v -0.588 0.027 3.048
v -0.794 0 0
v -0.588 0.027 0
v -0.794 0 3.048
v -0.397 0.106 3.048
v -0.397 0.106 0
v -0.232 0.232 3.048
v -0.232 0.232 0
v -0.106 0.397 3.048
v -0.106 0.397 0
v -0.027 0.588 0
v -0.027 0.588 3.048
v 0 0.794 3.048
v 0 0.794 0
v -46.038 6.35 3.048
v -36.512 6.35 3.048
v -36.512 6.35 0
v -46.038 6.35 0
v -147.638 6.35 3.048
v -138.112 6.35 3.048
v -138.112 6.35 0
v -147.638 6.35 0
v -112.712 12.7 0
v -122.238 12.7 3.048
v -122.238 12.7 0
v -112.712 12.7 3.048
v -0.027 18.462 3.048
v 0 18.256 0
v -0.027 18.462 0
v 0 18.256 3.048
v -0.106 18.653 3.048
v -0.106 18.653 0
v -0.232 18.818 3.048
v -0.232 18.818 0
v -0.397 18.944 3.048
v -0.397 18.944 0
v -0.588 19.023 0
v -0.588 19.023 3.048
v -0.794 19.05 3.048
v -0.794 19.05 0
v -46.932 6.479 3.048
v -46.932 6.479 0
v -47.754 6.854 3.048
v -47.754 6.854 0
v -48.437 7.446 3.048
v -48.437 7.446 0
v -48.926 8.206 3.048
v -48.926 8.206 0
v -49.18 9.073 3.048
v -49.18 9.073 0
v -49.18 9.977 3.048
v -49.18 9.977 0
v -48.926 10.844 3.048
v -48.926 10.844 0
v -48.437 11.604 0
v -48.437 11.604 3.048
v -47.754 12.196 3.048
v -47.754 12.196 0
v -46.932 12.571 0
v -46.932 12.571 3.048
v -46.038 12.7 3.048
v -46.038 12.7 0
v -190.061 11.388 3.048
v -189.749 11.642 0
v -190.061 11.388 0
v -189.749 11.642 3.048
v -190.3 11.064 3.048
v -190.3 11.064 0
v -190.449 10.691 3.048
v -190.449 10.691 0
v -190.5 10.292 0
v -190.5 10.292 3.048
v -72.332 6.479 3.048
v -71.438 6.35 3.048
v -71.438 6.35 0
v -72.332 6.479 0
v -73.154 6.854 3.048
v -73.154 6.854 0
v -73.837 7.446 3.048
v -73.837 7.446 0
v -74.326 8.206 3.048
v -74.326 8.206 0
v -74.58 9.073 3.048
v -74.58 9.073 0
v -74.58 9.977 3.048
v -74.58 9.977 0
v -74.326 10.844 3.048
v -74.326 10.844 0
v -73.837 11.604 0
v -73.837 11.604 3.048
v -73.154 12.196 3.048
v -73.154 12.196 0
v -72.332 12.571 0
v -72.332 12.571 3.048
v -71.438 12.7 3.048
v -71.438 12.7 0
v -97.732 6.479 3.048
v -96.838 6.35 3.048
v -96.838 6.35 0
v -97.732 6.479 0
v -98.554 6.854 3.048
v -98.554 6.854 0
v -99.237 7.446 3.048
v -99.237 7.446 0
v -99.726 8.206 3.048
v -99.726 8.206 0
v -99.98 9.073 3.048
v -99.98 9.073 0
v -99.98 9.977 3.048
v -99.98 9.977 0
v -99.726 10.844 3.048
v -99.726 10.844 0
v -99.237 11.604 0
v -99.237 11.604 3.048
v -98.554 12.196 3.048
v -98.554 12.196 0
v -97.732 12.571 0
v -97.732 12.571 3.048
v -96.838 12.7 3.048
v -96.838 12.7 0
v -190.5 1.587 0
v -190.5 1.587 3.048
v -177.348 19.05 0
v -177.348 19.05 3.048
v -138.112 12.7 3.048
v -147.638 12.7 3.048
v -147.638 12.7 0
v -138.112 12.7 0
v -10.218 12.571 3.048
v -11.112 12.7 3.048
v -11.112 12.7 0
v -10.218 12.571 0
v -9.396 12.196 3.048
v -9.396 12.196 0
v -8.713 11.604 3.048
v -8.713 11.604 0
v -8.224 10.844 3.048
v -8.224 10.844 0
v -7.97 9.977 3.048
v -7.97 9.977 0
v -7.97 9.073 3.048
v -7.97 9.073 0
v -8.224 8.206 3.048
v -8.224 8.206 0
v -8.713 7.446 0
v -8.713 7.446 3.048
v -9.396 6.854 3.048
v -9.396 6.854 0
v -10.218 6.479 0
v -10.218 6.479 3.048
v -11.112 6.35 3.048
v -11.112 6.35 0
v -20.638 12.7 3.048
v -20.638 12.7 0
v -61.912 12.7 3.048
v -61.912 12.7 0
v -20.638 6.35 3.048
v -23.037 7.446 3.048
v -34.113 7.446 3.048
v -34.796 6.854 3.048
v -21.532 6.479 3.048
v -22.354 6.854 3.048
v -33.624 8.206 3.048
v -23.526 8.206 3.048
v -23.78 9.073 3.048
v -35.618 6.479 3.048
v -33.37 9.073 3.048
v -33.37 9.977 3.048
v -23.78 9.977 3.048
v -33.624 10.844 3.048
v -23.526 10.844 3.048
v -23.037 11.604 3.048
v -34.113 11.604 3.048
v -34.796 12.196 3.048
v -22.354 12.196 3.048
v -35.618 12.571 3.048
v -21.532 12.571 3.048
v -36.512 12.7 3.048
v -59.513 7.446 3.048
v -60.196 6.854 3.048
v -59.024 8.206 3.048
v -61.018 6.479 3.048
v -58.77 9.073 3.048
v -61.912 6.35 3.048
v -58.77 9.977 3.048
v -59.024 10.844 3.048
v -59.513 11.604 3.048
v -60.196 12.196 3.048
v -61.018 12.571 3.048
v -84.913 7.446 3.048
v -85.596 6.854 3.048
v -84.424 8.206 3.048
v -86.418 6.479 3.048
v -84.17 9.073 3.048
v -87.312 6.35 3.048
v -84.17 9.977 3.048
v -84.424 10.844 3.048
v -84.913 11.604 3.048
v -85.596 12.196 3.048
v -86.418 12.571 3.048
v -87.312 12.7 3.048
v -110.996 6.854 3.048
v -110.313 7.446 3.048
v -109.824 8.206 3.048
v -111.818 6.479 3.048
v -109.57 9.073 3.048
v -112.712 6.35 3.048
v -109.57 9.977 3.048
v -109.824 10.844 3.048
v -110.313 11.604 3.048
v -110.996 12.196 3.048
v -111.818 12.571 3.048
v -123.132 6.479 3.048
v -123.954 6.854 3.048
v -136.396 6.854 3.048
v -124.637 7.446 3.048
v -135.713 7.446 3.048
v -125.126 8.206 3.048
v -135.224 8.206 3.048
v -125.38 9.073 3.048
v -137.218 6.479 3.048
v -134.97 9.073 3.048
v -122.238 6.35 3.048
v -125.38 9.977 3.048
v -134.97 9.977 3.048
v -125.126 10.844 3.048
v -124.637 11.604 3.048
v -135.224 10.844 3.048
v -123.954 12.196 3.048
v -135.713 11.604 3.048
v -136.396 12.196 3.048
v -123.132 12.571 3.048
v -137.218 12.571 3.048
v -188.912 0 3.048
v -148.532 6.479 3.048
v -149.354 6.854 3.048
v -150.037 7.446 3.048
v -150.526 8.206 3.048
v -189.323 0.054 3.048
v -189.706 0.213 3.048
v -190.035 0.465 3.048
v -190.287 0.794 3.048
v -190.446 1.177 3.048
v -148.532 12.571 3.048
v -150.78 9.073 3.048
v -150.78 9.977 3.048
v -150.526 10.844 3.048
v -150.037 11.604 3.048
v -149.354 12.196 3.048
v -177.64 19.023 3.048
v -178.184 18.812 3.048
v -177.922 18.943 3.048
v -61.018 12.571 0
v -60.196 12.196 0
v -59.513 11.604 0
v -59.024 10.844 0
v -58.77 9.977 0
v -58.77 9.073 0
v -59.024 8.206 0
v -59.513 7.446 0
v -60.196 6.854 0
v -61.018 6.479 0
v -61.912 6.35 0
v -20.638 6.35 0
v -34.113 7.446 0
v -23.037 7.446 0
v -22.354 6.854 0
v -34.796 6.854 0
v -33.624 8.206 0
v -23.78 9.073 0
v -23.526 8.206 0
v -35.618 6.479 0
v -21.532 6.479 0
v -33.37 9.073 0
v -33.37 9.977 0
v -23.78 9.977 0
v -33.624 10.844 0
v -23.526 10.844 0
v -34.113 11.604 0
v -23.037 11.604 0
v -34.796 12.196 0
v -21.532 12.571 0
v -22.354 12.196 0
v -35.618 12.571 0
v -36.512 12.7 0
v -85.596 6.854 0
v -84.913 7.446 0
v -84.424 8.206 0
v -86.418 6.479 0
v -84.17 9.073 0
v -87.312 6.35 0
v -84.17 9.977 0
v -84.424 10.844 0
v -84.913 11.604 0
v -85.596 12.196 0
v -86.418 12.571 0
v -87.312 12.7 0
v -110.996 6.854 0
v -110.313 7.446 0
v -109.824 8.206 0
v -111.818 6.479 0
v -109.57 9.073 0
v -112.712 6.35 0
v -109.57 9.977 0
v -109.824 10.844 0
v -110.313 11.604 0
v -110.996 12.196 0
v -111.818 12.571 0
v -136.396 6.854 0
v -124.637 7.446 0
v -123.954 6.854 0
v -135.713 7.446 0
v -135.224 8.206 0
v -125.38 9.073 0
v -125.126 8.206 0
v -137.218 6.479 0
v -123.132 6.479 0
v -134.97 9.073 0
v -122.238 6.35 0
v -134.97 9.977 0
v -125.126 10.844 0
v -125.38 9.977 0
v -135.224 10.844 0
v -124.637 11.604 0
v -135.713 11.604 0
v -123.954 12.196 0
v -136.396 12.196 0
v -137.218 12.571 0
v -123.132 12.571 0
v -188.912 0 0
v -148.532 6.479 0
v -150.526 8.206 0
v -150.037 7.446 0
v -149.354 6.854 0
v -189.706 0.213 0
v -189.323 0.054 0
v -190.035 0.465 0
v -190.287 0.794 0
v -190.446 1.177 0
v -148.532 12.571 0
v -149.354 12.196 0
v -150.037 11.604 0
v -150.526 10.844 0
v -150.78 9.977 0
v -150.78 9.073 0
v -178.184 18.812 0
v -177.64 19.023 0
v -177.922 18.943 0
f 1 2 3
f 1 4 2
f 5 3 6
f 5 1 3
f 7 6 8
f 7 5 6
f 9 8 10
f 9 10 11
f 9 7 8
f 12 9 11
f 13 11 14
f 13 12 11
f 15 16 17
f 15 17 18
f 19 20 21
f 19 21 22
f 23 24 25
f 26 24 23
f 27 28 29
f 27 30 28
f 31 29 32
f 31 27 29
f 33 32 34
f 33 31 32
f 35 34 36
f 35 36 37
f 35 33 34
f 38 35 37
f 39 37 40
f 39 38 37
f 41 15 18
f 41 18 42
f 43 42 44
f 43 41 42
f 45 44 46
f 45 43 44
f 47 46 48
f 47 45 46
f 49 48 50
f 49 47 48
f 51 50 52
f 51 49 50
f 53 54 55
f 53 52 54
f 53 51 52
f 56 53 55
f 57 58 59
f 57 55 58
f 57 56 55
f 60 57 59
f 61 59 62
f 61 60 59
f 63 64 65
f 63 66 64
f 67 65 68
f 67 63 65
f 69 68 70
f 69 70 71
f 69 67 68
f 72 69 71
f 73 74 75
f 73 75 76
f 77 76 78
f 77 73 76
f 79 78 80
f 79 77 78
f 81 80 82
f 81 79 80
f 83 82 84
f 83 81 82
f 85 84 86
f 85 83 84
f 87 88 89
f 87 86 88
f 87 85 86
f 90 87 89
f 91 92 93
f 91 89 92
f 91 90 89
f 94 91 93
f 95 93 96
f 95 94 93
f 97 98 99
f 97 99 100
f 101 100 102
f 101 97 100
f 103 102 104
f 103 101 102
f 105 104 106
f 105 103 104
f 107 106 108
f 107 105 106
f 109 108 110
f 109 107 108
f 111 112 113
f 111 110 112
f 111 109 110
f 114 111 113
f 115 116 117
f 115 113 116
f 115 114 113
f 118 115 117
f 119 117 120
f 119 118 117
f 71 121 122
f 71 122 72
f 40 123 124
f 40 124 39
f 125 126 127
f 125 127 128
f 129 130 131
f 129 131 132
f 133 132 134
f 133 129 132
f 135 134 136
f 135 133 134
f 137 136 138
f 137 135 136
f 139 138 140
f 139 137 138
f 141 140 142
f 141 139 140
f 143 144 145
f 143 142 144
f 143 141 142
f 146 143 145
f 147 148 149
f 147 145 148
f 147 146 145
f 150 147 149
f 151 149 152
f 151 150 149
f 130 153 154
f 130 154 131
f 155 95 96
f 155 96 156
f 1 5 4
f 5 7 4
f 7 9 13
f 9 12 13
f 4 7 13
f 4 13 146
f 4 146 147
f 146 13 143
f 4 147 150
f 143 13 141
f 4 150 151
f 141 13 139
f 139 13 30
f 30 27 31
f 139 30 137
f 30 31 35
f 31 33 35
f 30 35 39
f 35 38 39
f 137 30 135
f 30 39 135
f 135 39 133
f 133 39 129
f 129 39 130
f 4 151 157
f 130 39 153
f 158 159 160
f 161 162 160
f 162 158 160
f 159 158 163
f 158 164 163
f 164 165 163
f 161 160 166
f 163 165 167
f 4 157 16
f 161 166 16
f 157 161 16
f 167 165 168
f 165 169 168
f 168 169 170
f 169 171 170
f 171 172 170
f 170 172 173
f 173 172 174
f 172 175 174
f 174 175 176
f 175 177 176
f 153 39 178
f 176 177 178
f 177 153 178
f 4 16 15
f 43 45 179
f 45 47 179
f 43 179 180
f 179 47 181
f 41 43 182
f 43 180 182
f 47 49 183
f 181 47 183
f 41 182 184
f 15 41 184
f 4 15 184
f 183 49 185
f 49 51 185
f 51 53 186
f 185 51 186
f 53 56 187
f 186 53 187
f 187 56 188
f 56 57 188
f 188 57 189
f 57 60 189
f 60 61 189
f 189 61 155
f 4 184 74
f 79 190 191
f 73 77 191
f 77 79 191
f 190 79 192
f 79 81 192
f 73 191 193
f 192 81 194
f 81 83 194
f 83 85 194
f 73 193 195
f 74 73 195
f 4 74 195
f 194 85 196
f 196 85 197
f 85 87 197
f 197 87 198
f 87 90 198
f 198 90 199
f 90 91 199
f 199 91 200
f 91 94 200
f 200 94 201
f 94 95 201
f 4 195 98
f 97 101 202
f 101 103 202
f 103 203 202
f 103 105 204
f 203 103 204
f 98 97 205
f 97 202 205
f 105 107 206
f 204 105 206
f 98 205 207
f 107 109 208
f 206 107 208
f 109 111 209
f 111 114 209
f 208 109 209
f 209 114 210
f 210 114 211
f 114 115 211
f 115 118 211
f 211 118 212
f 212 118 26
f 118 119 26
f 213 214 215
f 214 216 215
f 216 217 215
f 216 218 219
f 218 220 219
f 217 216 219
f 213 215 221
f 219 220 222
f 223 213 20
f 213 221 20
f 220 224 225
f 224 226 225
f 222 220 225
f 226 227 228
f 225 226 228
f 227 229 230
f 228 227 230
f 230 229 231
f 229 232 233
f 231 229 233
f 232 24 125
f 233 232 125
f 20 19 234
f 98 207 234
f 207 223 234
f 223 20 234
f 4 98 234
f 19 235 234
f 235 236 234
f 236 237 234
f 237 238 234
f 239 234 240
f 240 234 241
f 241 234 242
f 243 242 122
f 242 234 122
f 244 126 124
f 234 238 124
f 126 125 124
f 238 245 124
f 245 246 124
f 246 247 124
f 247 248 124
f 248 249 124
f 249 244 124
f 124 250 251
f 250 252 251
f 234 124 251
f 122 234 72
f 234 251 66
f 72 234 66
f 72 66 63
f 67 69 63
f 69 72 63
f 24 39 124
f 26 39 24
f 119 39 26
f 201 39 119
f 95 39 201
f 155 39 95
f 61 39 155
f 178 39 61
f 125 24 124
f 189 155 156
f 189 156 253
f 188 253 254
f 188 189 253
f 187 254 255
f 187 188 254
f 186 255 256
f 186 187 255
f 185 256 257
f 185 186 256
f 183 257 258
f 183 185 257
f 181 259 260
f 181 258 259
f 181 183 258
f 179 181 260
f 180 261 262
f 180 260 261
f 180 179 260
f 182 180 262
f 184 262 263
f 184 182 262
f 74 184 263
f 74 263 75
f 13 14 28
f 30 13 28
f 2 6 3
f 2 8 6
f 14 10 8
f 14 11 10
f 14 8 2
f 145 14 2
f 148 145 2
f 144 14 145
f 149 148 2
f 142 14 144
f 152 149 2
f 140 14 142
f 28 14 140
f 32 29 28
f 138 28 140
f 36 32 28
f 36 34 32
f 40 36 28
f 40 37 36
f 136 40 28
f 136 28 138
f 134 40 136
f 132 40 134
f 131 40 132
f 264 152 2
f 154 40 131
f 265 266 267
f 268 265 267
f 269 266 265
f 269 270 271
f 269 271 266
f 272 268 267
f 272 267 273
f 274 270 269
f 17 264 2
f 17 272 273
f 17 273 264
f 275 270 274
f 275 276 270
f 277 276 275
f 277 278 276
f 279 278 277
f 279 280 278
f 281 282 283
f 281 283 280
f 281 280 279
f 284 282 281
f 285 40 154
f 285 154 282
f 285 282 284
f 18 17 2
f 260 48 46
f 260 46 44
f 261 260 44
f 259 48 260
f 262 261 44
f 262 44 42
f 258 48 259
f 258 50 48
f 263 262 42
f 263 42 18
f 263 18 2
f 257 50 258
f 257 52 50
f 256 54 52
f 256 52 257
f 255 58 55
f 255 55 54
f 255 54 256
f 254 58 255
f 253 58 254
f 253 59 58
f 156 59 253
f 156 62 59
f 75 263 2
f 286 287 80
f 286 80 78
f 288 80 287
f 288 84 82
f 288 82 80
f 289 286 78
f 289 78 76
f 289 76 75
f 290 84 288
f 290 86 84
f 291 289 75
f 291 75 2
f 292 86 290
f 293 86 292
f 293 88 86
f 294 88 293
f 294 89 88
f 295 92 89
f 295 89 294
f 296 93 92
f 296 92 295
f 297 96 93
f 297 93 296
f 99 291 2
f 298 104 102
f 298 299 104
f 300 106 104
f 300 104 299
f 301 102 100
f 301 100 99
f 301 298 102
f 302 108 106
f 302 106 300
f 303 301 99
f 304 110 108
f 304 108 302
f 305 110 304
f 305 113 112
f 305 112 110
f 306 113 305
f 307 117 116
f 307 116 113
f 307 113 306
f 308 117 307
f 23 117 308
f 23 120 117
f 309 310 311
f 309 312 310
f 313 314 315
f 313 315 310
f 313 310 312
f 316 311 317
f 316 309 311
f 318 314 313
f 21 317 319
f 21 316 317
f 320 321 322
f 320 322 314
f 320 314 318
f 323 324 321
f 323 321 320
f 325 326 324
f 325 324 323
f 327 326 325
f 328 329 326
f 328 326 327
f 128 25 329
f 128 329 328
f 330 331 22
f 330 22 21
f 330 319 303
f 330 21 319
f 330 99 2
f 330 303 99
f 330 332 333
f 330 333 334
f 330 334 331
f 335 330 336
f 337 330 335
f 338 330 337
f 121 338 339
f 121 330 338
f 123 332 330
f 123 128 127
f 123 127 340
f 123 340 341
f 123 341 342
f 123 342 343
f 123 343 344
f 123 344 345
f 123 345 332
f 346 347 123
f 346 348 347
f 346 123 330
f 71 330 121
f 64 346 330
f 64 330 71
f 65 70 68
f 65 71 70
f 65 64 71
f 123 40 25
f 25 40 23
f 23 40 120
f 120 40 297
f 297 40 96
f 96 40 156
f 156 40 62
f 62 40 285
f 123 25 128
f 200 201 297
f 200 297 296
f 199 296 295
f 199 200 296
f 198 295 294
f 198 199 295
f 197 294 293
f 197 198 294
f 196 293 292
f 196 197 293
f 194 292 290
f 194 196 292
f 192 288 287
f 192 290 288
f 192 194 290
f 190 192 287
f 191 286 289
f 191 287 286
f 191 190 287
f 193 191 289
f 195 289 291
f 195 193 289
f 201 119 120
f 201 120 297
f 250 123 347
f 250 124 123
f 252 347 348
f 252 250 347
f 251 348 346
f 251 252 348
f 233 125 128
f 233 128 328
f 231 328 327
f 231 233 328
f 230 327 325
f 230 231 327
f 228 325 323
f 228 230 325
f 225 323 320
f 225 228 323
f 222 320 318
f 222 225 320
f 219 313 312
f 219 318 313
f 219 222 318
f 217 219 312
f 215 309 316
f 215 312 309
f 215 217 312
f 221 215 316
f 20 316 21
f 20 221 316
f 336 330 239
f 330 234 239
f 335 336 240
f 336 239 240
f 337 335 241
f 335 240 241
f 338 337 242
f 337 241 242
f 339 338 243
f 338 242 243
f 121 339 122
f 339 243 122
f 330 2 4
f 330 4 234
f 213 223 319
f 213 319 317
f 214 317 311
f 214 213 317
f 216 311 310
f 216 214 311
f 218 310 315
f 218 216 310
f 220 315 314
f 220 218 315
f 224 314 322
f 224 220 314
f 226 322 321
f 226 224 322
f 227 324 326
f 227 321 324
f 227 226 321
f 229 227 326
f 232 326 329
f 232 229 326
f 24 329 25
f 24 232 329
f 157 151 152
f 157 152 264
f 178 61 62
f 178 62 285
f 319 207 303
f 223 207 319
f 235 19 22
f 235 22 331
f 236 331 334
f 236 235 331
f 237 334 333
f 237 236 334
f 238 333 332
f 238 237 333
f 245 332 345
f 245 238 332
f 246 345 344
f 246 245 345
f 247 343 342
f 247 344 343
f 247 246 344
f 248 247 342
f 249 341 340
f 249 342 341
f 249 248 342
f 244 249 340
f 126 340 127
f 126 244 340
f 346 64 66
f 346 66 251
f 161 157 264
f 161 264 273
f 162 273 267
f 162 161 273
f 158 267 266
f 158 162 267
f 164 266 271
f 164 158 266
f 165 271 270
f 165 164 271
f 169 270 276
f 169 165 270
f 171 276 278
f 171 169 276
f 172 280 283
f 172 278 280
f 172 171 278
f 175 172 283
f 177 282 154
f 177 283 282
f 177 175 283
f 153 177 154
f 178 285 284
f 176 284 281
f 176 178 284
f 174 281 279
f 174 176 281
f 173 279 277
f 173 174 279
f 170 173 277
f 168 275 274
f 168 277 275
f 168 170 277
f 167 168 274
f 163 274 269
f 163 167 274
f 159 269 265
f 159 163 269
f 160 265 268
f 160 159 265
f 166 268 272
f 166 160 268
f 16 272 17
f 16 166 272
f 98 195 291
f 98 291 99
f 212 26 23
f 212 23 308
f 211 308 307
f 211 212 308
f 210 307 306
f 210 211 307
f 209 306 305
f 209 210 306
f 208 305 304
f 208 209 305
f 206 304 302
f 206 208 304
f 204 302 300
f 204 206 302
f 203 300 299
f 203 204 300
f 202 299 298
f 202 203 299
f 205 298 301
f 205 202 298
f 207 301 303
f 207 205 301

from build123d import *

# Parameters (mm, degrees)
SKETCH1_W           = 177.8
SKETCH1_H           = 19.05
BOSS_EXTRUDE1_DEPTH = 3.048
CUT_EXTRUDE1_DEPTH  = 179.843598722
BOSS_EXTRUDE2_DEPTH = 3.048
FILLET1_R           = 1.5875
FILLET2_R           = 0.79375


with BuildPart() as part:
    # Sketch1 → Boss-Extrude1 (new body)
    with BuildSketch(Plane.XY):
        with Locations((-88.9, 9.525)):
            Rectangle(SKETCH1_W, SKETCH1_H)
    extrude(amount=BOSS_EXTRUDE1_DEPTH)

    # Sketch2 → Cut-Extrude1 (cut, through all)
    with BuildSketch(Plane.XY.offset(3.048)):
        with BuildLine():
            Line((-11.1125, 6.35), (-20.6375, 6.35))
            ThreePointArc((-20.6375, 6.35), (-23.8125, 9.525), (-20.6375, 12.7))
            Line((-20.6375, 12.7), (-11.1125, 12.7))
            ThreePointArc((-11.1125, 12.7), (-7.9375, 9.525), (-11.1125, 6.35))
        make_face()
        with BuildLine():
            Line((-36.5125, 6.35), (-46.0375, 6.35))
            ThreePointArc((-46.0375, 6.35), (-49.2125, 9.525), (-46.0375, 12.7))
            Line((-46.0375, 12.7), (-36.5125, 12.7))
            ThreePointArc((-36.5125, 12.7), (-33.3375, 9.525), (-36.5125, 6.35))
        make_face()
        with BuildLine():
            Line((-61.9125, 6.35), (-71.4375, 6.35))
            ThreePointArc((-71.4375, 6.35), (-74.6125, 9.525), (-71.4375, 12.7))
            Line((-71.4375, 12.7), (-61.9125, 12.7))
            ThreePointArc((-61.9125, 12.7), (-58.7375, 9.525), (-61.9125, 6.35))
        make_face()
        with BuildLine():
            Line((-87.3125, 6.35), (-96.8375, 6.35))
            ThreePointArc((-96.8375, 6.35), (-100.0125, 9.525), (-96.8375, 12.7))
            Line((-96.8375, 12.7), (-87.3125, 12.7))
            ThreePointArc((-87.3125, 12.7), (-84.1375, 9.525), (-87.3125, 6.35))
        make_face()
        with BuildLine():
            Line((-112.7125, 6.35), (-122.2375, 6.35))
            ThreePointArc((-122.2375, 6.35), (-125.4125, 9.525), (-122.2375, 12.7))
            Line((-122.2375, 12.7), (-112.7125, 12.7))
            ThreePointArc((-112.7125, 12.7), (-109.5375, 9.525), (-112.7125, 6.35))
        make_face()
        with BuildLine():
            Line((-138.1125, 6.35), (-147.6375, 6.35))
            ThreePointArc((-147.6375, 6.35), (-150.8125, 9.525), (-147.6375, 12.7))
            Line((-147.6375, 12.7), (-138.1125, 12.7))
            ThreePointArc((-138.1125, 12.7), (-134.9375, 9.525), (-138.1125, 6.35))
        make_face()
    extrude(amount=-CUT_EXTRUDE1_DEPTH, mode=Mode.SUBTRACT)

    # Sketch3 → Boss-Extrude2 (add)
    with BuildSketch(Plane(origin=(0, 0, 0), x_dir=(-1, 0, 0), z_dir=(0, 0, -1))):
        Polygon((177.8, 0), (190.5, 0), (190.5, 11.176), (177.8, 19.05), align=None)
    extrude(amount=-BOSS_EXTRUDE2_DEPTH)

    # Fillet1
    fillet1_edges = [part.edges().sort_by_distance(p)[0] for p in [
        (-190.5, 0, 1.524),
        (-190.5, 11.176, 1.524),
        (-177.8, 19.05, 1.524),
    ]]
    fillet(fillet1_edges, radius=FILLET1_R)

    # Fillet2
    fillet2_edges = [part.edges().sort_by_distance(p)[0] for p in [
        (0, 0, 1.524),
        (0, 19.05, 1.524),
    ]]
    fillet(fillet2_edges, radius=FILLET2_R)


solid = part.part
